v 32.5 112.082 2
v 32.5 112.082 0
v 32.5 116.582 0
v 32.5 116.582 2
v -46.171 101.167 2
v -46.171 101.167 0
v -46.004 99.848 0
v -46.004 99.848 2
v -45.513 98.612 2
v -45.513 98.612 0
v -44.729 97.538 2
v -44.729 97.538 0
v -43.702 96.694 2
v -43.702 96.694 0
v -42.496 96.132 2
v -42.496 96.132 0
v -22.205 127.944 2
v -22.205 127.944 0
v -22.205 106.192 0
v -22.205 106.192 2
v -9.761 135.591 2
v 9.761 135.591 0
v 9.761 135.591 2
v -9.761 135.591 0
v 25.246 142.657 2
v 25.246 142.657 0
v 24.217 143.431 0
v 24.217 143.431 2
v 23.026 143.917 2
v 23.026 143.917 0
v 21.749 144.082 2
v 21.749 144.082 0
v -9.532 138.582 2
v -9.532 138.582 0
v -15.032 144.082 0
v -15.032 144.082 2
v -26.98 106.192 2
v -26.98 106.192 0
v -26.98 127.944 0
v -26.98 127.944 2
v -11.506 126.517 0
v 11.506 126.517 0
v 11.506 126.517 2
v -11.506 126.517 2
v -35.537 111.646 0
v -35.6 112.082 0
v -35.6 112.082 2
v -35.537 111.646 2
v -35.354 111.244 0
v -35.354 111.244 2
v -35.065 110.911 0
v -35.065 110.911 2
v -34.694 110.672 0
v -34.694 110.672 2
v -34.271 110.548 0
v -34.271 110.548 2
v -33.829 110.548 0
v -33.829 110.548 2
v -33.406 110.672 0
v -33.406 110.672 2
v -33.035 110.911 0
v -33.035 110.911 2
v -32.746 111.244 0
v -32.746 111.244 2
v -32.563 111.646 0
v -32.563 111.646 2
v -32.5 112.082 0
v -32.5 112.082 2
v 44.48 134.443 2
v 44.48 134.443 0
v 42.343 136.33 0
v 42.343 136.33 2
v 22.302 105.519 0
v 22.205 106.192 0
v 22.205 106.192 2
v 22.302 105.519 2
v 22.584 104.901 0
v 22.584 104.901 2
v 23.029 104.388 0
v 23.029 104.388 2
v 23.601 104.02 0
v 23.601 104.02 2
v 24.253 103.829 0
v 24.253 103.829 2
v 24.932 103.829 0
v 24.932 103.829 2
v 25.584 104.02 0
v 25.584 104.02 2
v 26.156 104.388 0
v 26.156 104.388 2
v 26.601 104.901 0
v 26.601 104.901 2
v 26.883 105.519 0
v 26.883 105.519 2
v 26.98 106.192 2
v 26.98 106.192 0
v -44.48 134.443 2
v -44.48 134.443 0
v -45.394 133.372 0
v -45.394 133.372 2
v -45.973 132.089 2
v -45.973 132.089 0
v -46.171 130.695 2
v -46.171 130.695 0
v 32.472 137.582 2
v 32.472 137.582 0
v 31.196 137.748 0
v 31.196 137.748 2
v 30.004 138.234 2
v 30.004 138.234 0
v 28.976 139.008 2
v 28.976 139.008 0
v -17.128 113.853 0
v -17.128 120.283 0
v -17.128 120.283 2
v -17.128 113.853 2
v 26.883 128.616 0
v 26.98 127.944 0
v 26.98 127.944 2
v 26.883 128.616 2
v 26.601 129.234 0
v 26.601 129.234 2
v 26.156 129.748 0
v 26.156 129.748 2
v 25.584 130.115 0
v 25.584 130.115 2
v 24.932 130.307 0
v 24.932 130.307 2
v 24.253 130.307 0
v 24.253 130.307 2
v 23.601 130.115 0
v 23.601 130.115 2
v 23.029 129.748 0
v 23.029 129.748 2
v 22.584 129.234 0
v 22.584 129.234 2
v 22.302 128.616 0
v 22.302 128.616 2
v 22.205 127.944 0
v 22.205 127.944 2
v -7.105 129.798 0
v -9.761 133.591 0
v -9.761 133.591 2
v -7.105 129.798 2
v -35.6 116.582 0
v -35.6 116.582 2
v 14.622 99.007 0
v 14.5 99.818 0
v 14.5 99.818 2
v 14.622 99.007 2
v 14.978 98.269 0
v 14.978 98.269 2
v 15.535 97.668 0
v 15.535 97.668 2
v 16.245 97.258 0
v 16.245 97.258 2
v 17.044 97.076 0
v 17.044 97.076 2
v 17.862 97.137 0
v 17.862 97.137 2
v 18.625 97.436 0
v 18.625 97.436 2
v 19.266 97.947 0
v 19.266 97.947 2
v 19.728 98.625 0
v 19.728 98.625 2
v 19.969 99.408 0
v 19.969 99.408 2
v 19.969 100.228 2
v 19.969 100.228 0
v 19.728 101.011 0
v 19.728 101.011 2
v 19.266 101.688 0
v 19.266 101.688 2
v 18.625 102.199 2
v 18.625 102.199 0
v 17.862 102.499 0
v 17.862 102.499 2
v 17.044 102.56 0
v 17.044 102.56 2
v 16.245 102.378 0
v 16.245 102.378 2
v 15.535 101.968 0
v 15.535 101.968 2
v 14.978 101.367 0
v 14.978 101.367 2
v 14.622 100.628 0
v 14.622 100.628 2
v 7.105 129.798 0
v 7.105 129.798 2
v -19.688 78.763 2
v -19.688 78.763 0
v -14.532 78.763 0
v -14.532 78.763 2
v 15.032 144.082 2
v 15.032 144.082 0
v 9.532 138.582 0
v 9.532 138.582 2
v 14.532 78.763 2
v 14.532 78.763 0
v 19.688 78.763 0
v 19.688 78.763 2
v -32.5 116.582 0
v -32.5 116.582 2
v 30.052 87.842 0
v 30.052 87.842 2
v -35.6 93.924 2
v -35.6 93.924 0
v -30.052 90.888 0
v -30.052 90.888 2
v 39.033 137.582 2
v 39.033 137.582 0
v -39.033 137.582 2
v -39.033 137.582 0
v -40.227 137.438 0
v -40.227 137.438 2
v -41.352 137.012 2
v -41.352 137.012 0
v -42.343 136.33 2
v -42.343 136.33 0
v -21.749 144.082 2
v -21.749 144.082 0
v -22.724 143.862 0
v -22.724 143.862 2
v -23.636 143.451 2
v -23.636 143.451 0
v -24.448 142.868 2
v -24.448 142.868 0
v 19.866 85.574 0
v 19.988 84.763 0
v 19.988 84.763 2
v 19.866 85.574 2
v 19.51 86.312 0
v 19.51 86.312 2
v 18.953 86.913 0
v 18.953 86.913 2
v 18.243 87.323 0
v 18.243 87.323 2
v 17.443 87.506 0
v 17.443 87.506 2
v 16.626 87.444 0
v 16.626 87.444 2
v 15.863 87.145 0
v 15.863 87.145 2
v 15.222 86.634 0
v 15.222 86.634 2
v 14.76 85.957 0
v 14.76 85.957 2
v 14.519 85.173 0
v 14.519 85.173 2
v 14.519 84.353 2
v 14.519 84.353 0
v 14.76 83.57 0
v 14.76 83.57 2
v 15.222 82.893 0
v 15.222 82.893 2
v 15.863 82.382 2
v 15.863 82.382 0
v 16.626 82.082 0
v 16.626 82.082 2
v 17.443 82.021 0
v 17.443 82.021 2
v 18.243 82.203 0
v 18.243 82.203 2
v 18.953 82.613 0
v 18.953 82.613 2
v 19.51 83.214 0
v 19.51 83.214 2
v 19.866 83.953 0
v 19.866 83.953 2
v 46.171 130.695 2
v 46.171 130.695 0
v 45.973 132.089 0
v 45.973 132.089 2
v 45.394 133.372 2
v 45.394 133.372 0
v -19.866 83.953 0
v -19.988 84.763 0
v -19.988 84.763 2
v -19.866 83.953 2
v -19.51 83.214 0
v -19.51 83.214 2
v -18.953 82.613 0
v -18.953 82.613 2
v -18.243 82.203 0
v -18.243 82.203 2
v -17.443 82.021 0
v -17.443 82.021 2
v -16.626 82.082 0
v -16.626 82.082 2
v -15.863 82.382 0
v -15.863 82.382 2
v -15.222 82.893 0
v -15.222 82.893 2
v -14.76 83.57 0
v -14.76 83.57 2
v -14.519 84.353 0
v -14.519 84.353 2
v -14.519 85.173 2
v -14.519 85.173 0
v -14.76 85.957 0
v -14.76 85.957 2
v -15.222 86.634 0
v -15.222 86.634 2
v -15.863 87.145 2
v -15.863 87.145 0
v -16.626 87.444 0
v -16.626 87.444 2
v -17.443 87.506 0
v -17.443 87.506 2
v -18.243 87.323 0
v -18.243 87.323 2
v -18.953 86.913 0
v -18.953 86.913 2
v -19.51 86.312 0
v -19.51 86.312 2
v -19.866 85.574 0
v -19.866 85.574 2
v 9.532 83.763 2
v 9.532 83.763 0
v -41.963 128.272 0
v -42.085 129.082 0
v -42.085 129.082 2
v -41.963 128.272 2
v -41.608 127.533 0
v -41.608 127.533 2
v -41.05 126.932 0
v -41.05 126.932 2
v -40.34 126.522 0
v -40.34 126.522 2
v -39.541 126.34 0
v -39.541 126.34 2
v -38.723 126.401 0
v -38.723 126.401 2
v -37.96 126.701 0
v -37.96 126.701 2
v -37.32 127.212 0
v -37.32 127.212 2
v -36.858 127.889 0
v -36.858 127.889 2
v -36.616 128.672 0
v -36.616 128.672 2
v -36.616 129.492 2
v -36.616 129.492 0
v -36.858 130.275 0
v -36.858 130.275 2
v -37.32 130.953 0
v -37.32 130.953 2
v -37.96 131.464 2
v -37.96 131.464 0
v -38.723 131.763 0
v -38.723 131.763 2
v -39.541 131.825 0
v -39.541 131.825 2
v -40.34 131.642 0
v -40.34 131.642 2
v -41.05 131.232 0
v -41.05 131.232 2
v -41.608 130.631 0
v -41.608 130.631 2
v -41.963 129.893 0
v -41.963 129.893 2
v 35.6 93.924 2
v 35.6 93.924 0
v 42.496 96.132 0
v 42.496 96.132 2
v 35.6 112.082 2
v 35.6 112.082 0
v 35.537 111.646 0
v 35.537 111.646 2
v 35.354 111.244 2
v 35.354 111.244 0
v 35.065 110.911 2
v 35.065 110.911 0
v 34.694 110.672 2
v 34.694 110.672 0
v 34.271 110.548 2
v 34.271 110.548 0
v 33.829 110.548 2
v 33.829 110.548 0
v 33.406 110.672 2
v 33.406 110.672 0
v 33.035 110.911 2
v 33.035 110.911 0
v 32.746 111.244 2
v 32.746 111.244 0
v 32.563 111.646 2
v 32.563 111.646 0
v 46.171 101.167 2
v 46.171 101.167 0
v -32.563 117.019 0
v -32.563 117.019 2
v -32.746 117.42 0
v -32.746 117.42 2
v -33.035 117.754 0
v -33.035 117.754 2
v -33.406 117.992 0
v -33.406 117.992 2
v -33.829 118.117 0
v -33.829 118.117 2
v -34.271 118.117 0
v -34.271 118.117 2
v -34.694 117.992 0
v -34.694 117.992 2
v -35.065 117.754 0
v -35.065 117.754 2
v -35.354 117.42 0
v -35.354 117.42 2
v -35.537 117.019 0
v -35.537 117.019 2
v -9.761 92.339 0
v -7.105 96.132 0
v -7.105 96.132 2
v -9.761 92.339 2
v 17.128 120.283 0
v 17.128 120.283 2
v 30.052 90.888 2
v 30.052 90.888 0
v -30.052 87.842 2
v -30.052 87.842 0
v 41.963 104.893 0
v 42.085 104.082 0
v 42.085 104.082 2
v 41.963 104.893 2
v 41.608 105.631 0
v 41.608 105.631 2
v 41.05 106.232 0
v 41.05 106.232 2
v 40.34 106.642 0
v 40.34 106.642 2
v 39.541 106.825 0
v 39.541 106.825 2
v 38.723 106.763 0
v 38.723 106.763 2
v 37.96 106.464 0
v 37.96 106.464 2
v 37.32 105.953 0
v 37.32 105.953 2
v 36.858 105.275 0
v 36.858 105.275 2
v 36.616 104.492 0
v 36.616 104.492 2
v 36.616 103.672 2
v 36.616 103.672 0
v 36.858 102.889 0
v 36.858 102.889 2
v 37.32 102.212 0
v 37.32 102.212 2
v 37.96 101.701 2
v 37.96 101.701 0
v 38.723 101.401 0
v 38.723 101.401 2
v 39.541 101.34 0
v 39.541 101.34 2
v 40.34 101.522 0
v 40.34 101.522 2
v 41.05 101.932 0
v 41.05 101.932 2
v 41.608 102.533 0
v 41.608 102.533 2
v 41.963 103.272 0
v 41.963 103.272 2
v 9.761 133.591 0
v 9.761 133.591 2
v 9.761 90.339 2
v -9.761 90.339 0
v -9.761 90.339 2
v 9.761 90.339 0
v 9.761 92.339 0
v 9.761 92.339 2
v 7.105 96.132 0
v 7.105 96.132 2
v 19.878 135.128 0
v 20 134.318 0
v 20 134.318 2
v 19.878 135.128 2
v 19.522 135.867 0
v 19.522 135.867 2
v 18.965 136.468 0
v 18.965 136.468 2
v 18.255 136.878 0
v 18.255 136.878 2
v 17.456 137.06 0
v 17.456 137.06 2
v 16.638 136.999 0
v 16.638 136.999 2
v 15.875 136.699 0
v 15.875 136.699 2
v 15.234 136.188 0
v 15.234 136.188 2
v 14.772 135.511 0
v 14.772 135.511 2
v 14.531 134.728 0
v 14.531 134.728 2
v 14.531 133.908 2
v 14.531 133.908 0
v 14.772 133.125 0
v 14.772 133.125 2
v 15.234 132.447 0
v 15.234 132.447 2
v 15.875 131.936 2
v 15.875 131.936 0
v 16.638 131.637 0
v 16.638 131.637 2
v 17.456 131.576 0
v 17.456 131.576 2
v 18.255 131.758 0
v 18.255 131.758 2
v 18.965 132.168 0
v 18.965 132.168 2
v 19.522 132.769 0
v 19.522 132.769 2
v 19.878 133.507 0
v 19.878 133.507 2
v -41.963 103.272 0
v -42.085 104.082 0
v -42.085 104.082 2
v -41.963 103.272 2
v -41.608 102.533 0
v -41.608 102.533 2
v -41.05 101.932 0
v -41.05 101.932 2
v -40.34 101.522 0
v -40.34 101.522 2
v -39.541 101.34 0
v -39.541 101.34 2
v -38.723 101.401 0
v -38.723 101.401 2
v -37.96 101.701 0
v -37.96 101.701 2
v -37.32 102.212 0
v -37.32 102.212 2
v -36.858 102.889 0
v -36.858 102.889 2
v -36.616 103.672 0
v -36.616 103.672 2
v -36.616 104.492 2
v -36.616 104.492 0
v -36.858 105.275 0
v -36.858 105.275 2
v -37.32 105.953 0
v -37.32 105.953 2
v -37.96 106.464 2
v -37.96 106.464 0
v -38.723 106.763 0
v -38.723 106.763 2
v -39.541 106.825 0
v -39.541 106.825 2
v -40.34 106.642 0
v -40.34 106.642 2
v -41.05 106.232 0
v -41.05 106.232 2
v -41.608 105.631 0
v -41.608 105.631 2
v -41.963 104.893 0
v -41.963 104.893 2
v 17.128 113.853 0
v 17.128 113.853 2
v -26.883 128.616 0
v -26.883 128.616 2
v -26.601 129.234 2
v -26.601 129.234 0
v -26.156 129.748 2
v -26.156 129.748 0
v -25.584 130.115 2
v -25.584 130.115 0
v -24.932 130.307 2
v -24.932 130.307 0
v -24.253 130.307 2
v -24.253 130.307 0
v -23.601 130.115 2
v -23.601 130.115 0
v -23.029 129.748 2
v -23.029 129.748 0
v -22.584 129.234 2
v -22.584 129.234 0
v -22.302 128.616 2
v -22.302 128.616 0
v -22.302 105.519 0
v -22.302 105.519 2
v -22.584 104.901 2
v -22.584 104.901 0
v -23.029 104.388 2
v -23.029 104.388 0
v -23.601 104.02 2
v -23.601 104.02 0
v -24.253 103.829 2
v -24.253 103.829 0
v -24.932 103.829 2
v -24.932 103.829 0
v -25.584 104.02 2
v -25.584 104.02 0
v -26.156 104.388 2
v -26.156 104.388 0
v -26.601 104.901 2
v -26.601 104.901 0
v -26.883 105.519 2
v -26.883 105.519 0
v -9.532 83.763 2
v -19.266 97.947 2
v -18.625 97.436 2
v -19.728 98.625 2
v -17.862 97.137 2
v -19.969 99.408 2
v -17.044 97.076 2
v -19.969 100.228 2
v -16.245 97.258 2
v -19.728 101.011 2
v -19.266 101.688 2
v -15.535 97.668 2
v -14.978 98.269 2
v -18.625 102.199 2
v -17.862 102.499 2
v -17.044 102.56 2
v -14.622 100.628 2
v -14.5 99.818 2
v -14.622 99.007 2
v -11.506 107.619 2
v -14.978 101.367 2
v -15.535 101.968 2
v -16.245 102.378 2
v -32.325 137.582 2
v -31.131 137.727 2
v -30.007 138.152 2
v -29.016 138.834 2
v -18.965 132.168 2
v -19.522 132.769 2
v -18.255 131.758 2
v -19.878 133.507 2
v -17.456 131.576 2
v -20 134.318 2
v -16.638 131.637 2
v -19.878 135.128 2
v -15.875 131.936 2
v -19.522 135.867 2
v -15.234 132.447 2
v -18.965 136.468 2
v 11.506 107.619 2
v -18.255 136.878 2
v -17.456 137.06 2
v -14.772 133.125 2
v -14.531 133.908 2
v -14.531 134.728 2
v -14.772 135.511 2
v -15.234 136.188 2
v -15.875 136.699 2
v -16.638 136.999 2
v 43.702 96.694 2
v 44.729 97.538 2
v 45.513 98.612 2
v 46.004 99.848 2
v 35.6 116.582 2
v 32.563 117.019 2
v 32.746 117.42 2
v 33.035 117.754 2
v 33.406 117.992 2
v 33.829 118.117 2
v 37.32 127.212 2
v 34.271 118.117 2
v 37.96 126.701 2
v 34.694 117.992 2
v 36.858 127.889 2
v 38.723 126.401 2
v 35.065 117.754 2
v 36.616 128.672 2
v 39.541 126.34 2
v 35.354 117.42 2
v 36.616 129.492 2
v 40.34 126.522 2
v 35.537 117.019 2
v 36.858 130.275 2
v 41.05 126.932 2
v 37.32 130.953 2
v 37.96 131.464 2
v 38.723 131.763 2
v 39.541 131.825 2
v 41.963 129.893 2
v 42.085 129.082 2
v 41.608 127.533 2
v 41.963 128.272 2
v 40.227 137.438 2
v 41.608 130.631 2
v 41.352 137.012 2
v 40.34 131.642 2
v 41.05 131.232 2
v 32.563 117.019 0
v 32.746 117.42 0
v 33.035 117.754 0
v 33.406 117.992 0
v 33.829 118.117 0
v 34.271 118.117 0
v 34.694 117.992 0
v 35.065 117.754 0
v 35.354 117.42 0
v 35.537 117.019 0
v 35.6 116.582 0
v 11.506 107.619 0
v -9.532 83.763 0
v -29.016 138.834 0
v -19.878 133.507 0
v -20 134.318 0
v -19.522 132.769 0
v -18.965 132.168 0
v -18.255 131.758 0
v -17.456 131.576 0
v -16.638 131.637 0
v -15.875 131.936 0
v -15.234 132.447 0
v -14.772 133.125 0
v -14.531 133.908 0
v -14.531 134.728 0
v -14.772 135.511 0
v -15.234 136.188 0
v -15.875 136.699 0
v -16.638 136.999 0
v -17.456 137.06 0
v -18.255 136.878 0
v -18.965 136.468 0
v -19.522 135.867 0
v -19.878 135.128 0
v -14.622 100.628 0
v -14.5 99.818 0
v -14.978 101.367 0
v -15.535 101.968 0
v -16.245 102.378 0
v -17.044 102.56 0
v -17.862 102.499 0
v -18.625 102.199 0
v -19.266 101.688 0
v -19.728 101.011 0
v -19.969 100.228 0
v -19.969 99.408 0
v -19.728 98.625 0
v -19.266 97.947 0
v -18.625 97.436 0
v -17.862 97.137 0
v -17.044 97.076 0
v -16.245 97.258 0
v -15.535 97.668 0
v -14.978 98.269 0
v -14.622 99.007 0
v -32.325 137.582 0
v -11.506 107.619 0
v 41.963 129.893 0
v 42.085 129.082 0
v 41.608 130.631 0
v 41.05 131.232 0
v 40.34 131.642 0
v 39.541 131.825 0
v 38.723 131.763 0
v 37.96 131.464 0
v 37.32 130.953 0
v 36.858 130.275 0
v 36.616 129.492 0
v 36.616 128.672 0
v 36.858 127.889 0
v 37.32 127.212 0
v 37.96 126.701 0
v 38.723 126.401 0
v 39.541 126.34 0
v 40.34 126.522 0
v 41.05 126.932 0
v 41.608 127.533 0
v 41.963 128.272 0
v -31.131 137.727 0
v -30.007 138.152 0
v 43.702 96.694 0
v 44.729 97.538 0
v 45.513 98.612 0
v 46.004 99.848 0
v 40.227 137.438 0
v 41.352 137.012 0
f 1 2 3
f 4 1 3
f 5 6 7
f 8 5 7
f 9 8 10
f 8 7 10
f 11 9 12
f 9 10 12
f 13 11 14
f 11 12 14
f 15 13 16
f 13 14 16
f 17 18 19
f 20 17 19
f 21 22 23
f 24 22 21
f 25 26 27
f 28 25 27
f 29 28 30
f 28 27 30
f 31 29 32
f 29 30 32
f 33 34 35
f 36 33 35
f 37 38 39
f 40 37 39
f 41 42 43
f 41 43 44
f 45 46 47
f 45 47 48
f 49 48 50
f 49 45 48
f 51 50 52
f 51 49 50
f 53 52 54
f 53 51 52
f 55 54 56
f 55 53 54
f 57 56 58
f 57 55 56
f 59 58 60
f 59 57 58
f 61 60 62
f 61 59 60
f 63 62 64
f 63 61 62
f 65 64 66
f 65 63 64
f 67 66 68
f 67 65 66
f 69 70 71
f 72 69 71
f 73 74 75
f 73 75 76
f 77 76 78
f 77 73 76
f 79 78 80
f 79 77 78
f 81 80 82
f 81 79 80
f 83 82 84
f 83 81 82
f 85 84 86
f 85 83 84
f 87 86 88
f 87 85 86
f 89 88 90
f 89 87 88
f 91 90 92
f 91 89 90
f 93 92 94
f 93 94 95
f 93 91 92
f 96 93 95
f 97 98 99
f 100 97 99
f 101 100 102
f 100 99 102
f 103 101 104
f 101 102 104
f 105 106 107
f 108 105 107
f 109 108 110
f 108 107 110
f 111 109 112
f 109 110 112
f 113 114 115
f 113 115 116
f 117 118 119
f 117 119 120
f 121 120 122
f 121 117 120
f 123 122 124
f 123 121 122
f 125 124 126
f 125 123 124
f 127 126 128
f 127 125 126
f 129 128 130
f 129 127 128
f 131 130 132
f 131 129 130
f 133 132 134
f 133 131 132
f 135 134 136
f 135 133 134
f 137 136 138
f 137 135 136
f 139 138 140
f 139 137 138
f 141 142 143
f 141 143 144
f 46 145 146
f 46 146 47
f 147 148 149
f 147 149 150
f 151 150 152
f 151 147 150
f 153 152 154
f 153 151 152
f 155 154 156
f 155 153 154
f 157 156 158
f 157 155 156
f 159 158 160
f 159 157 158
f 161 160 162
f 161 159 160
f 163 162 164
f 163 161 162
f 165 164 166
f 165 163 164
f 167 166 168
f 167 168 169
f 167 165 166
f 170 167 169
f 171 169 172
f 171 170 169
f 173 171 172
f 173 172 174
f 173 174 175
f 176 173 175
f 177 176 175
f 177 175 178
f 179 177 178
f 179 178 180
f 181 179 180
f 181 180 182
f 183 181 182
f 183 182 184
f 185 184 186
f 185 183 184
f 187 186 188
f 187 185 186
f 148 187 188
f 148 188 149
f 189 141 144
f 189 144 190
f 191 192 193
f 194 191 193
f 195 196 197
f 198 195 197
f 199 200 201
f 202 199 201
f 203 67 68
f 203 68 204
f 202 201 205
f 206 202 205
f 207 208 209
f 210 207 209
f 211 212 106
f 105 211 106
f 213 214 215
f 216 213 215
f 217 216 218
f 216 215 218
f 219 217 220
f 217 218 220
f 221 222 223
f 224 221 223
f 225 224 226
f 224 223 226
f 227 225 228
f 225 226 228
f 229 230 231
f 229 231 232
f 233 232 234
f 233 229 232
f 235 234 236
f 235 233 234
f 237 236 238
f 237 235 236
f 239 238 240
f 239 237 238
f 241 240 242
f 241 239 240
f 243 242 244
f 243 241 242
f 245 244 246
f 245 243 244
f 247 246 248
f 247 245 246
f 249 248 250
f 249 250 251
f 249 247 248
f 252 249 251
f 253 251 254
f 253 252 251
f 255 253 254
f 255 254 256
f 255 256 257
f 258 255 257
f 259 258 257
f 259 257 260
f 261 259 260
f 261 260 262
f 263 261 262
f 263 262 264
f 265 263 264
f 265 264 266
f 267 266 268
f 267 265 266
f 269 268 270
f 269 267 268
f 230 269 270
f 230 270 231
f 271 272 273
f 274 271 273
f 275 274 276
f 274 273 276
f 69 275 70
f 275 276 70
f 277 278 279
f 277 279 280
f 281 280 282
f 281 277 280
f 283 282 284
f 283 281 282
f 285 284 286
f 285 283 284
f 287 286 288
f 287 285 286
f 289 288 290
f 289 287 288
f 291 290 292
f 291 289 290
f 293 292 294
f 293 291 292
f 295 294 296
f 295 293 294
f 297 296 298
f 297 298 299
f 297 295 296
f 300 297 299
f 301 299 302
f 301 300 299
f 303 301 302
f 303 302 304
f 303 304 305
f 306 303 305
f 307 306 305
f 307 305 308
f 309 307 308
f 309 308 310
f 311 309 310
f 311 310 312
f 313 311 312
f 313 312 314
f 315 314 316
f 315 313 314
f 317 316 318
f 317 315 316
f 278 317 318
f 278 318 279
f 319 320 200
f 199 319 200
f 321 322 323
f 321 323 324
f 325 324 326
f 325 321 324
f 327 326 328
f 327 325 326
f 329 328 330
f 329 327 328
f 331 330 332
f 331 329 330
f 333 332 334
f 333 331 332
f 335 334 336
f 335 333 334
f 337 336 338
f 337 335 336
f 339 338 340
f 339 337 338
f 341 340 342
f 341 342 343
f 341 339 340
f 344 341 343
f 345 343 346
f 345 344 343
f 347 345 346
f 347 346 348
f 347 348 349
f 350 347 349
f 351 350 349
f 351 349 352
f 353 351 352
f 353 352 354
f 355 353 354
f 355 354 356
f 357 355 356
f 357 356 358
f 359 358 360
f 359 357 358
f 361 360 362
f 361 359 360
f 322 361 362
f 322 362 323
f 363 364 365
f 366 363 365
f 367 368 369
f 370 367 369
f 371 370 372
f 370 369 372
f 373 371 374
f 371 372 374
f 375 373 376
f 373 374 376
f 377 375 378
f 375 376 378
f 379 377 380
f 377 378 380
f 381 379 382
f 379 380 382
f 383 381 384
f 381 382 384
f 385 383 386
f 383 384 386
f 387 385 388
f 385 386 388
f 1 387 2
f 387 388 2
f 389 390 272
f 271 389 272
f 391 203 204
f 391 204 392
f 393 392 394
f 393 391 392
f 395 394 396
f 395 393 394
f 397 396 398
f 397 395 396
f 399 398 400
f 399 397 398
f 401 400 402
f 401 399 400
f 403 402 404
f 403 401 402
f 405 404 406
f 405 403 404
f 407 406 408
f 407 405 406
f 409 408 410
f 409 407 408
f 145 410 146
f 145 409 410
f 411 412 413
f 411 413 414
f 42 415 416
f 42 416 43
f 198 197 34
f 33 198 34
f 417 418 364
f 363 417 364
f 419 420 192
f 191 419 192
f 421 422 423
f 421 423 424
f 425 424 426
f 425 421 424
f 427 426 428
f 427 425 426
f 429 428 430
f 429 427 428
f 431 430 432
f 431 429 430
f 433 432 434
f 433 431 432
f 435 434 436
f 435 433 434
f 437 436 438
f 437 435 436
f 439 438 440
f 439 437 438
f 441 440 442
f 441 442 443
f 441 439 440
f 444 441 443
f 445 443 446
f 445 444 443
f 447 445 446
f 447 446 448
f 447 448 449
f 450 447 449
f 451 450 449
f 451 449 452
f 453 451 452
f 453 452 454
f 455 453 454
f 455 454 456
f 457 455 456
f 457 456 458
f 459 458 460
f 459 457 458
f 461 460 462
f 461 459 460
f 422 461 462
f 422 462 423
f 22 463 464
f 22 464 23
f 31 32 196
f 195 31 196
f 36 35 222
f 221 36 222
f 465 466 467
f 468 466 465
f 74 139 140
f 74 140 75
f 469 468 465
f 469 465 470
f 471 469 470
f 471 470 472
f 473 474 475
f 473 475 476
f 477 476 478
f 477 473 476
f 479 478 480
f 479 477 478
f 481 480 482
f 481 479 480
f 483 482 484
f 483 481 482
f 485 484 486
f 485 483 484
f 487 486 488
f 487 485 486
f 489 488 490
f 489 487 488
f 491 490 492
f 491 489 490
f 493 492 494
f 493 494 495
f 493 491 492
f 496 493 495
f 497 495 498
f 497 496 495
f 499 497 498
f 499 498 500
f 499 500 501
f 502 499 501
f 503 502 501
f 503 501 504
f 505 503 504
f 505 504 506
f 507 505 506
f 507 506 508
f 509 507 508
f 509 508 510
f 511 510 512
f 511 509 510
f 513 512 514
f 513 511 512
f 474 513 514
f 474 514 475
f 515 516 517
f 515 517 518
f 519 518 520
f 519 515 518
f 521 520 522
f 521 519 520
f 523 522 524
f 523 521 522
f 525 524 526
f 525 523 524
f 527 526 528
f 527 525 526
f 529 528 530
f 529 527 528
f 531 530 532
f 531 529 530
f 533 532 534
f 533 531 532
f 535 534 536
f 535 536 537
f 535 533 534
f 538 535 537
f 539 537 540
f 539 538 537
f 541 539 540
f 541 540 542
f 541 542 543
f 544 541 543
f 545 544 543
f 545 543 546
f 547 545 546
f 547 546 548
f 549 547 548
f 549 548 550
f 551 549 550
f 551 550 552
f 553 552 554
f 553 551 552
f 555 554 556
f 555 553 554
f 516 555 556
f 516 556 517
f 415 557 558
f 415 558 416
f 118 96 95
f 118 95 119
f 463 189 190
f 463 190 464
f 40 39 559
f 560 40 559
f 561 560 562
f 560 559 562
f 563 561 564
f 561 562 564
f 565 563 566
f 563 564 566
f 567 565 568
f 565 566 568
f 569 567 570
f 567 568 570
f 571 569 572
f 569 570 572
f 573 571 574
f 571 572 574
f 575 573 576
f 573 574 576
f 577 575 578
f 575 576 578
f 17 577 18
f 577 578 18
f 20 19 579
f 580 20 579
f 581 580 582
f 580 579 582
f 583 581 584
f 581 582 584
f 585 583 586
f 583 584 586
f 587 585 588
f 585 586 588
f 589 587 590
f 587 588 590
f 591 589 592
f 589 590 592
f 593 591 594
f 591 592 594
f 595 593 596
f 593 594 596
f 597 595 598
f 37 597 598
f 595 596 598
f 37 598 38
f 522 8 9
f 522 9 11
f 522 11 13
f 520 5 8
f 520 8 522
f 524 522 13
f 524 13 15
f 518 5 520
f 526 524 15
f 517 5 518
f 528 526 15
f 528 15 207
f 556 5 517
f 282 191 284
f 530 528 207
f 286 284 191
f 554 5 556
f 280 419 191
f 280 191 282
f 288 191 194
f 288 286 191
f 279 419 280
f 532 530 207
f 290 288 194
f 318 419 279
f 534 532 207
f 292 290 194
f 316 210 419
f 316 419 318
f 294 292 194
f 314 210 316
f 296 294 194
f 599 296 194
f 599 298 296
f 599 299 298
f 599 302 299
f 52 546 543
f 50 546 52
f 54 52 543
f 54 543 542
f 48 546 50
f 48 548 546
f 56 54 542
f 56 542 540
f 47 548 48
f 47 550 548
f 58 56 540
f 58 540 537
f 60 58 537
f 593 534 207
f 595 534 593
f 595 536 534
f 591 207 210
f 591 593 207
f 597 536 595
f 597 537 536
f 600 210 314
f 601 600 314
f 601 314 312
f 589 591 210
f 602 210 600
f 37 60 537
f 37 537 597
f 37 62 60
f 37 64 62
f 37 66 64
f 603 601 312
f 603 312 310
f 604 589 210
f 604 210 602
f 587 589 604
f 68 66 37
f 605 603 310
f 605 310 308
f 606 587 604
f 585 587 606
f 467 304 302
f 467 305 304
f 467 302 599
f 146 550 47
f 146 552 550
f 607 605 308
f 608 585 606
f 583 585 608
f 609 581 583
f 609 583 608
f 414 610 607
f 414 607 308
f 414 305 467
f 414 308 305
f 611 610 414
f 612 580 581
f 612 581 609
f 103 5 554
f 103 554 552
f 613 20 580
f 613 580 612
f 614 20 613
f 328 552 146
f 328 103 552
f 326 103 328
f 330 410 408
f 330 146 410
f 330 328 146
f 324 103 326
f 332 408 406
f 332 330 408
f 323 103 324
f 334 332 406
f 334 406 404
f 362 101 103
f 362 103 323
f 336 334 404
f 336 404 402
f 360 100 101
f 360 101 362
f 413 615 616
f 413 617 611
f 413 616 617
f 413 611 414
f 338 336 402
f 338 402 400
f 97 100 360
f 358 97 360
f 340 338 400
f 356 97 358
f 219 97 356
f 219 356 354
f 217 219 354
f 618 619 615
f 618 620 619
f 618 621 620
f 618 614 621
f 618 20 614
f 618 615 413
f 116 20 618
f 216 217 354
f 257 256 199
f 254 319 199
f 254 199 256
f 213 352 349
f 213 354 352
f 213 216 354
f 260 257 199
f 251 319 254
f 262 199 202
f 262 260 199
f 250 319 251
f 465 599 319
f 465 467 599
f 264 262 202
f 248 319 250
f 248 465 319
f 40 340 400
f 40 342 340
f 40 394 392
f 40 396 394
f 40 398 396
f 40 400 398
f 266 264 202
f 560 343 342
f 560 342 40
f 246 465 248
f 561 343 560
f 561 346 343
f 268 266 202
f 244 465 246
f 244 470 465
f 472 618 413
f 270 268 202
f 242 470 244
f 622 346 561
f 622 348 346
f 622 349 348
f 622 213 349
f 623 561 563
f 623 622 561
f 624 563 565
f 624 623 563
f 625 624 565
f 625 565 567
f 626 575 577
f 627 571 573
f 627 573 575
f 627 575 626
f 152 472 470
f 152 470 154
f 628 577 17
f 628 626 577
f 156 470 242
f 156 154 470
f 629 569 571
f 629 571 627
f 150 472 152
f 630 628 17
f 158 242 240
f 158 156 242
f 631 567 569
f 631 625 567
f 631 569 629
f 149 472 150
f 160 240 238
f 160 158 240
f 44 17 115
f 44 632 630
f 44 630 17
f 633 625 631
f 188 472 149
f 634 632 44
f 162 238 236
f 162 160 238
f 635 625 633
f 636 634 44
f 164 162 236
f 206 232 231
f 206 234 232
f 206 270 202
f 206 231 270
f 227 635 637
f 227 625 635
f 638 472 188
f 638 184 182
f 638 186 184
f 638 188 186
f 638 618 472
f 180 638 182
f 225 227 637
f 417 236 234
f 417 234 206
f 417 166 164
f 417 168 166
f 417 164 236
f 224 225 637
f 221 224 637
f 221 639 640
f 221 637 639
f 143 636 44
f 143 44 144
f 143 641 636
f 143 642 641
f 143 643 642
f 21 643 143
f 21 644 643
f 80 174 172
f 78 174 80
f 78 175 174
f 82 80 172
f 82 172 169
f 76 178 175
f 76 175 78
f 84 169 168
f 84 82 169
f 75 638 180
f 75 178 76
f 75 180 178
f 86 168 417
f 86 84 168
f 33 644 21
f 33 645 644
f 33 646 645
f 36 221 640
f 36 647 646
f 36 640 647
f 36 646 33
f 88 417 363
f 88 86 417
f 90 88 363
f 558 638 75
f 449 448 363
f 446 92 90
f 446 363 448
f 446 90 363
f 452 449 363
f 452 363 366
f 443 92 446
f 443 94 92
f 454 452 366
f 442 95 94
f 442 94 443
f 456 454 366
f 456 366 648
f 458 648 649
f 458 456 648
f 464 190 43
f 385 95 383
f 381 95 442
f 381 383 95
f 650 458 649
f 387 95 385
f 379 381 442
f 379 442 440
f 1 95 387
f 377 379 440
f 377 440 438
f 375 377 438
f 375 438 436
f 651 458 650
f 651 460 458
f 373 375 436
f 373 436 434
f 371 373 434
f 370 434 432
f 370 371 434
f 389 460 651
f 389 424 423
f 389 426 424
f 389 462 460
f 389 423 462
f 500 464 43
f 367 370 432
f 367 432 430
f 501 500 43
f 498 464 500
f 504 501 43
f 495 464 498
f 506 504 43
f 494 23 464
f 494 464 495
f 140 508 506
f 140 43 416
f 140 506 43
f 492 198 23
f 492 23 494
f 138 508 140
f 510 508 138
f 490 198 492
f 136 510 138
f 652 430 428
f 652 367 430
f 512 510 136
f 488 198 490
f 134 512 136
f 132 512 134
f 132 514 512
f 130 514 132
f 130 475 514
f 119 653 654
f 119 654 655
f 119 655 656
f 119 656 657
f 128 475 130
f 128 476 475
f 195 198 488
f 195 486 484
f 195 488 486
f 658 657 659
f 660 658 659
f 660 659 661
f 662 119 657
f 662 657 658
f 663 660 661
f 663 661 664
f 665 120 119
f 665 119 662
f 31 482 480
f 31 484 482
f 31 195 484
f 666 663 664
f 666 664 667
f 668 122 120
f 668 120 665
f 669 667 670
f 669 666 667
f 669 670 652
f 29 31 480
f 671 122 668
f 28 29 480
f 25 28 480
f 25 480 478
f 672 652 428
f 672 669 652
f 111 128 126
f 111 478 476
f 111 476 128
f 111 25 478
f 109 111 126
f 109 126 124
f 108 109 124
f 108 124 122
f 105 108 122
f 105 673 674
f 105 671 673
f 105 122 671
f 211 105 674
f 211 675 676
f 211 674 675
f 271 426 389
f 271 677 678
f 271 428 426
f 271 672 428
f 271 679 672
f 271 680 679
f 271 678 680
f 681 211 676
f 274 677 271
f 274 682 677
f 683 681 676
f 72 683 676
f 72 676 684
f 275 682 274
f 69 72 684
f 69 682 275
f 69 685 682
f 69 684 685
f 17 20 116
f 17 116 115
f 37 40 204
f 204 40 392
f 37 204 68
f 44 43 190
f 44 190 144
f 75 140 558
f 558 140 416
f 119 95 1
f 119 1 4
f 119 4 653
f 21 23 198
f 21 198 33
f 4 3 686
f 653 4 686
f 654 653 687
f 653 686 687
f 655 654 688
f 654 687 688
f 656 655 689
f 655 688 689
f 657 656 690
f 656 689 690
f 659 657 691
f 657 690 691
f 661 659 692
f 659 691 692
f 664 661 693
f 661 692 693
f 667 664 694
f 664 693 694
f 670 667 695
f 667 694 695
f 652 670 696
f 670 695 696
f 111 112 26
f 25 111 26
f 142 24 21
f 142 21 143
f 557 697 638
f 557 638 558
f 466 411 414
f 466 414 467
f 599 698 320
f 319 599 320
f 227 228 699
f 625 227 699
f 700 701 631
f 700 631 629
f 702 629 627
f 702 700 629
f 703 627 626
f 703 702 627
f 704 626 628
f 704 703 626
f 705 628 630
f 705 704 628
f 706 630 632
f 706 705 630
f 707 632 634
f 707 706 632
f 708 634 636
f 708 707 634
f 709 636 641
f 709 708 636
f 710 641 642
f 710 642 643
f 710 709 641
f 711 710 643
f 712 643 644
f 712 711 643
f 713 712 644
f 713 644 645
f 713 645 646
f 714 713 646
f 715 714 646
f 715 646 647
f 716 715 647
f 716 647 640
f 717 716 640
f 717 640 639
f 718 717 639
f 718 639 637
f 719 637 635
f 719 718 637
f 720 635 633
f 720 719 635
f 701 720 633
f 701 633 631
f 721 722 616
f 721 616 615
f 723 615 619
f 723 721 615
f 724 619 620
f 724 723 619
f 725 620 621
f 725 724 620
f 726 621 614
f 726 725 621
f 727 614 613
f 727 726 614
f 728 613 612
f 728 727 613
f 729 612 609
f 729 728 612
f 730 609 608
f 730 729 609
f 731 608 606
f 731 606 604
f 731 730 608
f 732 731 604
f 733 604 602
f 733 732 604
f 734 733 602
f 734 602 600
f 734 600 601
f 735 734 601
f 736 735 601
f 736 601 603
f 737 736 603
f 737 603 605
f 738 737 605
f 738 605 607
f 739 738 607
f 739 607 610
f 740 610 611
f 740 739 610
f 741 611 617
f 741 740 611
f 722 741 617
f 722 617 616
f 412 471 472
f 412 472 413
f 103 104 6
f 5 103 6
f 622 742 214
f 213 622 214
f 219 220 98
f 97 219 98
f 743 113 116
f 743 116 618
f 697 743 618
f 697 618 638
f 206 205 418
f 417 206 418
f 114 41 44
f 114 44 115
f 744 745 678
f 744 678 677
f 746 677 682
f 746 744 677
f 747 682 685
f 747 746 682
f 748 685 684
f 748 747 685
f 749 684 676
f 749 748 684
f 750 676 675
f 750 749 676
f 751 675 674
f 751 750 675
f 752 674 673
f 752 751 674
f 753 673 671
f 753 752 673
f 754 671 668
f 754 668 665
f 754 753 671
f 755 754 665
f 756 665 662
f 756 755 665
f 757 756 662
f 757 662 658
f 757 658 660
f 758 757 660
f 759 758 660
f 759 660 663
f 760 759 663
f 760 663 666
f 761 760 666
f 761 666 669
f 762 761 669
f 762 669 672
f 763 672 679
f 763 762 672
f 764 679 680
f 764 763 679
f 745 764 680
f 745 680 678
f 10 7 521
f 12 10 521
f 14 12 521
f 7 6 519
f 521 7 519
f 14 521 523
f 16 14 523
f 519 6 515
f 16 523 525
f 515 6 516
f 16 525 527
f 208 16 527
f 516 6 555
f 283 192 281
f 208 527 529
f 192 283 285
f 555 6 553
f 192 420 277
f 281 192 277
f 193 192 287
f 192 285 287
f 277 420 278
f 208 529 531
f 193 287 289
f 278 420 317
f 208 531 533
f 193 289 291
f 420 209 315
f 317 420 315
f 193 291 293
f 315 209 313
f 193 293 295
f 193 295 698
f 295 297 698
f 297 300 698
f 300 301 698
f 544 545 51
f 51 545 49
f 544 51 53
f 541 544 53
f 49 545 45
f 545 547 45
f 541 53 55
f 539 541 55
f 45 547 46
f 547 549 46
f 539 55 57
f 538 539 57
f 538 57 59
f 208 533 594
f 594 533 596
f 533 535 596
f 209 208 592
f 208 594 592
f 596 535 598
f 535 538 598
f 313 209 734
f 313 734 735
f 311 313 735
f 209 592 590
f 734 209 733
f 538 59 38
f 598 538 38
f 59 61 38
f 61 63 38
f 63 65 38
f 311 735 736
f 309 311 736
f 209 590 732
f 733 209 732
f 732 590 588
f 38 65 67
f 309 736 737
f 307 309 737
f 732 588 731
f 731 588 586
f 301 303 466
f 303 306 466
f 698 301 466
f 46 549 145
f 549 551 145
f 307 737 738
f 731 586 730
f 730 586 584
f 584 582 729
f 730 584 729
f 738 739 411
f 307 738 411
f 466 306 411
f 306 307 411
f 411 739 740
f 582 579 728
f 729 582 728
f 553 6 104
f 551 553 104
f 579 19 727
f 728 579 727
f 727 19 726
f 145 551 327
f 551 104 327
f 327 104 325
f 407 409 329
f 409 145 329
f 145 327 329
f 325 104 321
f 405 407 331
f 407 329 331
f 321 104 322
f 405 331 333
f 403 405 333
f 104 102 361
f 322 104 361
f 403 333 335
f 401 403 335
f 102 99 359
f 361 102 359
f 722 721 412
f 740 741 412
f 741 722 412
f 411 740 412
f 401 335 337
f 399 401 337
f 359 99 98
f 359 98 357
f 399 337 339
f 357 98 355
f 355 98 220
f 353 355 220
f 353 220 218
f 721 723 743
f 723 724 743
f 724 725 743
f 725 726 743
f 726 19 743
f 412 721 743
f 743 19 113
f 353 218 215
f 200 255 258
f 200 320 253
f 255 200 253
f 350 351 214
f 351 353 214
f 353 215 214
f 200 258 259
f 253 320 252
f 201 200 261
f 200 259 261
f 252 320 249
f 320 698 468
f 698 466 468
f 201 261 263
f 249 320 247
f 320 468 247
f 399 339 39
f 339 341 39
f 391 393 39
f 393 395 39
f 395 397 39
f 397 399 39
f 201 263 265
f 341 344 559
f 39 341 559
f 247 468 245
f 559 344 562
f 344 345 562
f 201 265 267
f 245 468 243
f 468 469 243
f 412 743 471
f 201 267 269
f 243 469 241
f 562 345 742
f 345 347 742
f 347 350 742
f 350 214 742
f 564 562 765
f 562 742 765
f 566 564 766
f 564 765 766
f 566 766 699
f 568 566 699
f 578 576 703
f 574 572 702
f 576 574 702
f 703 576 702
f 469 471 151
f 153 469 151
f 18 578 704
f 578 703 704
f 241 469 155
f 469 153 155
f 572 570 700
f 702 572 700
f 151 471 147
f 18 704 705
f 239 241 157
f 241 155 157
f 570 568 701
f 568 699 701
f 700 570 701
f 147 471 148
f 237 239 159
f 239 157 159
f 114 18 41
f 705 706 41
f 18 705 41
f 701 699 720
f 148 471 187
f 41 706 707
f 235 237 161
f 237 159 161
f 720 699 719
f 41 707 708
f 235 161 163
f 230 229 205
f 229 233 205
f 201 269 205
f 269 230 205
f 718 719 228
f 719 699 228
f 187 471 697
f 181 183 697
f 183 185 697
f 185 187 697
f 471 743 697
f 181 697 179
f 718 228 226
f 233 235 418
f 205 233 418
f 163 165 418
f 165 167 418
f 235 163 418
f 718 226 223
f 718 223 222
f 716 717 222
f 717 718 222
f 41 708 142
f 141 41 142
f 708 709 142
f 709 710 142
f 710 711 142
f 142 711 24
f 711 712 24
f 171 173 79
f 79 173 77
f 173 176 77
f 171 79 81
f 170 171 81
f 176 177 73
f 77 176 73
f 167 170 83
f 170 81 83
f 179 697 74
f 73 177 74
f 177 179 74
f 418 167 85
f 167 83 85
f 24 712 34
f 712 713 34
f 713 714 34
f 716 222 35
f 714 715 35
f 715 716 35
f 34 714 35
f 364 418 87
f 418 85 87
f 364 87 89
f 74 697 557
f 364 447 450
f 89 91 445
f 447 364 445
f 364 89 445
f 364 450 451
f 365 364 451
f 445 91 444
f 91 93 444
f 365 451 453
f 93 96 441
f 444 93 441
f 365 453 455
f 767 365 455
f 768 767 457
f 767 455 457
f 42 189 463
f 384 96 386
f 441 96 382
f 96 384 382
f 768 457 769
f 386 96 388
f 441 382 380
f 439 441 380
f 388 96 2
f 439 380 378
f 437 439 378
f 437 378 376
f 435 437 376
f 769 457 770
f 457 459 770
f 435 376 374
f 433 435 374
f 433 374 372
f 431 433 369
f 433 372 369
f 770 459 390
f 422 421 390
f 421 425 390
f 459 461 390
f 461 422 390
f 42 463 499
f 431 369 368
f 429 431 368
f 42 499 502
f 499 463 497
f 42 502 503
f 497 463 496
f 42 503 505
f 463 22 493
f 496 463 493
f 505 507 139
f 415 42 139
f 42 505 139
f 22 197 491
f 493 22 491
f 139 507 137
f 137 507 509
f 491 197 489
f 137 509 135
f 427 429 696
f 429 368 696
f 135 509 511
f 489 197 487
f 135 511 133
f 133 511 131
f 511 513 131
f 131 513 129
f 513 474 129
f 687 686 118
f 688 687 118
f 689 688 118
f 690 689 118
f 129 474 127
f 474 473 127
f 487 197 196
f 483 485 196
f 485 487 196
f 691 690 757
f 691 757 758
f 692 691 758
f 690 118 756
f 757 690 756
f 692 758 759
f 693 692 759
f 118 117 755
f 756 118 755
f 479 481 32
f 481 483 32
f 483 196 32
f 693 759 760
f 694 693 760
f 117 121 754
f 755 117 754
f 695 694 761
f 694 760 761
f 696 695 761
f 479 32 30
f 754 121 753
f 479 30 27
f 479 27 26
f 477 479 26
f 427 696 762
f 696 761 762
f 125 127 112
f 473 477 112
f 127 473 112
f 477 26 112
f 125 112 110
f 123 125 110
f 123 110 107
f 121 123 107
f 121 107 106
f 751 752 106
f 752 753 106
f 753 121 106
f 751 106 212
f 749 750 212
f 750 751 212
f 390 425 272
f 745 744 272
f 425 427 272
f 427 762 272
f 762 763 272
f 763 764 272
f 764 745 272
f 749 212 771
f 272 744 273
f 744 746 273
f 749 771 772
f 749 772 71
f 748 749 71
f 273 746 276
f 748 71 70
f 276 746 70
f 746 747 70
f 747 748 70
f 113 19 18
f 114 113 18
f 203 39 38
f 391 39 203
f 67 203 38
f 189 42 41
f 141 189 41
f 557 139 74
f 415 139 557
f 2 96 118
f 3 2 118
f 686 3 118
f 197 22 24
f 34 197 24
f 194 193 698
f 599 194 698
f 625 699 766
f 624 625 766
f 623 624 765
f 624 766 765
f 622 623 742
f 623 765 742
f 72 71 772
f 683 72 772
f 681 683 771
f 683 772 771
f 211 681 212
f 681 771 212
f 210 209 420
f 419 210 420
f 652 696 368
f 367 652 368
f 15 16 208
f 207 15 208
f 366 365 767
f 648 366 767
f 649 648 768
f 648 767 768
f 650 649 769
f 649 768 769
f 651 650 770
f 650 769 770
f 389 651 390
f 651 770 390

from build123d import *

# Parameters (mm, degrees)
SKETCH_1_R      = 2.75
EXTRUDE_1_DEPTH = 2


with BuildPart() as part:
    # 草图1 → 凸台-拉伸1 (new body)
    with BuildSketch(Plane.XY):
        with BuildLine():
            Line((-24.447800114, 142.867788384), (-29.015821613, 138.834288737))
            ThreePointArc((-29.015821613, 138.834288737), (-30.556091587, 137.905760103), (-32.325263946, 137.582300402))
            Line((-32.325263946, 137.582300402), (-39.033457742, 137.582300402))
            ThreePointArc((-39.033457742, 137.582300402), (-40.802630101, 137.2588407), (-42.342900075, 136.330312067))
            Line((-42.342900075, 136.330312067), (-44.480254451, 134.443057788))
            ThreePointArc((-44.480254451, 134.443057788), (-45.728619247, 132.750865708), (-46.170812117, 130.695046123))
            Line((-46.170812117, 130.695046123), (-46.170812117, 101.166813467))
            ThreePointArc((-46.170812117, 101.166813467), (-45.154526002, 98.050429516), (-42.496431366, 96.132300402))
            Line((-42.496431366, 96.132300402), (-35.6, 93.92431119))
            Line((-35.6, 93.92431119), (-30.05244945, 90.888042458))
            Line((-30.05244945, 90.888042458), (-30.05244945, 87.84217512))
            Line((-30.05244945, 87.84217512), (-19.688242157, 78.763336754))
            Line((-19.688242157, 78.763336754), (-14.532154357, 78.763336754))
            Line((-14.532154357, 78.763336754), (-9.532154357, 83.763336754))
            Line((-9.532154357, 83.763336754), (9.532154357, 83.763336754))
            Line((9.532154357, 83.763336754), (14.532154357, 78.763336754))
            Line((14.532154357, 78.763336754), (19.688242157, 78.763336754))
            Line((19.688242157, 78.763336754), (30.05244945, 87.84217512))
            Line((30.05244945, 87.84217512), (30.05244945, 90.888042458))
            Line((30.05244945, 90.888042458), (35.6, 93.92431119))
            Line((35.6, 93.92431119), (42.496431366, 96.132300402))
            ThreePointArc((42.496431366, 96.132300402), (45.154526002, 98.050429516), (46.170812117, 101.166813467))
            Line((46.170812117, 101.166813467), (46.170812117, 130.695046123))
            ThreePointArc((46.170812117, 130.695046123), (45.728619247, 132.750865708), (44.480254451, 134.443057788))
            Line((44.480254451, 134.443057788), (42.342900075, 136.330312067))
            ThreePointArc((42.342900075, 136.330312067), (40.802630101, 137.2588407), (39.033457742, 137.582300402))
            Line((39.033457742, 137.582300402), (32.472417217, 137.582300402))
            ThreePointArc((32.472417217, 137.582300402), (30.584617738, 137.952374579), (28.976268595, 139.007815151))
            Line((28.976268595, 139.007815151), (25.245537252, 142.656785653))
            ThreePointArc((25.245537252, 142.656785653), (23.637188108, 143.712226225), (21.74938863, 144.082300402))
            Line((21.74938863, 144.082300402), (15.032154357, 144.082300402))
            Line((15.032154357, 144.082300402), (9.532154357, 138.582300402))
            Line((9.532154357, 138.582300402), (-9.532154357, 138.582300402))
            Line((-9.532154357, 138.582300402), (-15.032154357, 144.082300402))
            Line((-15.032154357, 144.082300402), (-21.74938863, 144.082300402))
            ThreePointArc((-21.74938863, 144.082300402), (-23.190499918, 143.679240794), (-24.447800114, 142.867788384))
        make_face()
        with Locations((39.335406059, 129.082300402)):
            Circle(SKETCH_1_R, mode=Mode.SUBTRACT)
        with Locations((39.335406059, 104.082300402)):
            Circle(SKETCH_1_R, mode=Mode.SUBTRACT)
        with Locations((17.23796389, 84.763336754)):
            Circle(SKETCH_1_R, mode=Mode.SUBTRACT)
        with Locations(Location((-17.23796389, 84.763336754, 0), (0, 0, 180))):
            Circle(SKETCH_1_R, mode=Mode.SUBTRACT)
        with Locations(Location((-39.335406059, 104.082300402, 0), (0, 0, 180))):
            Circle(SKETCH_1_R, mode=Mode.SUBTRACT)
        with Locations(Location((-39.335406059, 129.082300402, 0), (0, 0, 180))):
            Circle(SKETCH_1_R, mode=Mode.SUBTRACT)
        with Locations((17.25, 134.317818161)):
            Circle(SKETCH_1_R, mode=Mode.SUBTRACT)
        with Locations(Location((17.25, 99.817818161, 0), (0, 0, 180))):
            Circle(SKETCH_1_R, mode=Mode.SUBTRACT)
        with Locations((-17.25, 99.817818161)):
            Circle(SKETCH_1_R, mode=Mode.SUBTRACT)
        with Locations(Location((-17.25, 134.317818161, 0), (0, 0, 180))):
            Circle(SKETCH_1_R, mode=Mode.SUBTRACT)
        Polygon((7.105388598, 96.132300402), (-7.105388598, 96.132300402), (-9.761471208, 92.339021317), (-9.761471208, 90.339021317), (9.761471208, 90.339021317), (9.761471208, 92.339021317), align=None, mode=Mode.SUBTRACT)
        with BuildLine():
            Line((-35.6, 116.582300402), (-35.6, 112.082300402))
            ThreePointArc((-35.6, 112.082300402), (-34.05, 110.532300402), (-32.5, 112.082300402))
            Line((-32.5, 112.082300402), (-32.5, 116.582300402))
            ThreePointArc((-32.5, 116.582300402), (-34.05, 118.132300402), (-35.6, 116.582300402))
        make_face(mode=Mode.SUBTRACT)
        with BuildLine():
            Line((35.6, 116.582300402), (35.6, 112.082300402))
            ThreePointArc((35.6, 112.082300402), (34.05, 110.532300402), (32.5, 112.082300402))
            Line((32.5, 112.082300402), (32.5, 116.582300402))
            ThreePointArc((32.5, 116.582300402), (34.05, 118.132300402), (35.6, 116.582300402))
        make_face(mode=Mode.SUBTRACT)
        Polygon((-17.12762315, 113.853040841), (-11.506056087, 107.618637195), (11.506056087, 107.618637195), (17.12762315, 113.853040841), (17.12762315, 120.282595482), (11.506056087, 126.516999128), (-11.506056087, 126.516999128), (-17.12762315, 120.282595482), align=None, mode=Mode.SUBTRACT)
        Polygon((-7.105388598, 129.79821171), (7.105388598, 129.79821171), (9.761471208, 133.591490795), (9.761471208, 135.591490795), (-9.761471208, 135.591490795), (-9.761471208, 133.591490795), align=None, mode=Mode.SUBTRACT)
        with BuildLine():
            Line((-22.20520244, 127.943672987), (-22.20520244, 106.191963336))
            ThreePointArc((-22.20520244, 106.191963336), (-24.592663446, 103.80450233), (-26.980124451, 106.191963336))
            Line((-26.980124451, 106.191963336), (-26.980124451, 127.943672987))
            ThreePointArc((-26.980124451, 127.943672987), (-24.592663446, 130.331133992), (-22.20520244, 127.943672987))
        make_face(mode=Mode.SUBTRACT)
        with BuildLine():
            Line((22.20520244, 127.943672987), (22.20520244, 106.191963336))
            ThreePointArc((22.20520244, 106.191963336), (24.592663446, 103.80450233), (26.980124451, 106.191963336))
            Line((26.980124451, 106.191963336), (26.980124451, 127.943672987))
            ThreePointArc((26.980124451, 127.943672987), (24.592663446, 130.331133992), (22.20520244, 127.943672987))
        make_face(mode=Mode.SUBTRACT)
    extrude(amount=EXTRUDE_1_DEPTH)


solid = part.part
